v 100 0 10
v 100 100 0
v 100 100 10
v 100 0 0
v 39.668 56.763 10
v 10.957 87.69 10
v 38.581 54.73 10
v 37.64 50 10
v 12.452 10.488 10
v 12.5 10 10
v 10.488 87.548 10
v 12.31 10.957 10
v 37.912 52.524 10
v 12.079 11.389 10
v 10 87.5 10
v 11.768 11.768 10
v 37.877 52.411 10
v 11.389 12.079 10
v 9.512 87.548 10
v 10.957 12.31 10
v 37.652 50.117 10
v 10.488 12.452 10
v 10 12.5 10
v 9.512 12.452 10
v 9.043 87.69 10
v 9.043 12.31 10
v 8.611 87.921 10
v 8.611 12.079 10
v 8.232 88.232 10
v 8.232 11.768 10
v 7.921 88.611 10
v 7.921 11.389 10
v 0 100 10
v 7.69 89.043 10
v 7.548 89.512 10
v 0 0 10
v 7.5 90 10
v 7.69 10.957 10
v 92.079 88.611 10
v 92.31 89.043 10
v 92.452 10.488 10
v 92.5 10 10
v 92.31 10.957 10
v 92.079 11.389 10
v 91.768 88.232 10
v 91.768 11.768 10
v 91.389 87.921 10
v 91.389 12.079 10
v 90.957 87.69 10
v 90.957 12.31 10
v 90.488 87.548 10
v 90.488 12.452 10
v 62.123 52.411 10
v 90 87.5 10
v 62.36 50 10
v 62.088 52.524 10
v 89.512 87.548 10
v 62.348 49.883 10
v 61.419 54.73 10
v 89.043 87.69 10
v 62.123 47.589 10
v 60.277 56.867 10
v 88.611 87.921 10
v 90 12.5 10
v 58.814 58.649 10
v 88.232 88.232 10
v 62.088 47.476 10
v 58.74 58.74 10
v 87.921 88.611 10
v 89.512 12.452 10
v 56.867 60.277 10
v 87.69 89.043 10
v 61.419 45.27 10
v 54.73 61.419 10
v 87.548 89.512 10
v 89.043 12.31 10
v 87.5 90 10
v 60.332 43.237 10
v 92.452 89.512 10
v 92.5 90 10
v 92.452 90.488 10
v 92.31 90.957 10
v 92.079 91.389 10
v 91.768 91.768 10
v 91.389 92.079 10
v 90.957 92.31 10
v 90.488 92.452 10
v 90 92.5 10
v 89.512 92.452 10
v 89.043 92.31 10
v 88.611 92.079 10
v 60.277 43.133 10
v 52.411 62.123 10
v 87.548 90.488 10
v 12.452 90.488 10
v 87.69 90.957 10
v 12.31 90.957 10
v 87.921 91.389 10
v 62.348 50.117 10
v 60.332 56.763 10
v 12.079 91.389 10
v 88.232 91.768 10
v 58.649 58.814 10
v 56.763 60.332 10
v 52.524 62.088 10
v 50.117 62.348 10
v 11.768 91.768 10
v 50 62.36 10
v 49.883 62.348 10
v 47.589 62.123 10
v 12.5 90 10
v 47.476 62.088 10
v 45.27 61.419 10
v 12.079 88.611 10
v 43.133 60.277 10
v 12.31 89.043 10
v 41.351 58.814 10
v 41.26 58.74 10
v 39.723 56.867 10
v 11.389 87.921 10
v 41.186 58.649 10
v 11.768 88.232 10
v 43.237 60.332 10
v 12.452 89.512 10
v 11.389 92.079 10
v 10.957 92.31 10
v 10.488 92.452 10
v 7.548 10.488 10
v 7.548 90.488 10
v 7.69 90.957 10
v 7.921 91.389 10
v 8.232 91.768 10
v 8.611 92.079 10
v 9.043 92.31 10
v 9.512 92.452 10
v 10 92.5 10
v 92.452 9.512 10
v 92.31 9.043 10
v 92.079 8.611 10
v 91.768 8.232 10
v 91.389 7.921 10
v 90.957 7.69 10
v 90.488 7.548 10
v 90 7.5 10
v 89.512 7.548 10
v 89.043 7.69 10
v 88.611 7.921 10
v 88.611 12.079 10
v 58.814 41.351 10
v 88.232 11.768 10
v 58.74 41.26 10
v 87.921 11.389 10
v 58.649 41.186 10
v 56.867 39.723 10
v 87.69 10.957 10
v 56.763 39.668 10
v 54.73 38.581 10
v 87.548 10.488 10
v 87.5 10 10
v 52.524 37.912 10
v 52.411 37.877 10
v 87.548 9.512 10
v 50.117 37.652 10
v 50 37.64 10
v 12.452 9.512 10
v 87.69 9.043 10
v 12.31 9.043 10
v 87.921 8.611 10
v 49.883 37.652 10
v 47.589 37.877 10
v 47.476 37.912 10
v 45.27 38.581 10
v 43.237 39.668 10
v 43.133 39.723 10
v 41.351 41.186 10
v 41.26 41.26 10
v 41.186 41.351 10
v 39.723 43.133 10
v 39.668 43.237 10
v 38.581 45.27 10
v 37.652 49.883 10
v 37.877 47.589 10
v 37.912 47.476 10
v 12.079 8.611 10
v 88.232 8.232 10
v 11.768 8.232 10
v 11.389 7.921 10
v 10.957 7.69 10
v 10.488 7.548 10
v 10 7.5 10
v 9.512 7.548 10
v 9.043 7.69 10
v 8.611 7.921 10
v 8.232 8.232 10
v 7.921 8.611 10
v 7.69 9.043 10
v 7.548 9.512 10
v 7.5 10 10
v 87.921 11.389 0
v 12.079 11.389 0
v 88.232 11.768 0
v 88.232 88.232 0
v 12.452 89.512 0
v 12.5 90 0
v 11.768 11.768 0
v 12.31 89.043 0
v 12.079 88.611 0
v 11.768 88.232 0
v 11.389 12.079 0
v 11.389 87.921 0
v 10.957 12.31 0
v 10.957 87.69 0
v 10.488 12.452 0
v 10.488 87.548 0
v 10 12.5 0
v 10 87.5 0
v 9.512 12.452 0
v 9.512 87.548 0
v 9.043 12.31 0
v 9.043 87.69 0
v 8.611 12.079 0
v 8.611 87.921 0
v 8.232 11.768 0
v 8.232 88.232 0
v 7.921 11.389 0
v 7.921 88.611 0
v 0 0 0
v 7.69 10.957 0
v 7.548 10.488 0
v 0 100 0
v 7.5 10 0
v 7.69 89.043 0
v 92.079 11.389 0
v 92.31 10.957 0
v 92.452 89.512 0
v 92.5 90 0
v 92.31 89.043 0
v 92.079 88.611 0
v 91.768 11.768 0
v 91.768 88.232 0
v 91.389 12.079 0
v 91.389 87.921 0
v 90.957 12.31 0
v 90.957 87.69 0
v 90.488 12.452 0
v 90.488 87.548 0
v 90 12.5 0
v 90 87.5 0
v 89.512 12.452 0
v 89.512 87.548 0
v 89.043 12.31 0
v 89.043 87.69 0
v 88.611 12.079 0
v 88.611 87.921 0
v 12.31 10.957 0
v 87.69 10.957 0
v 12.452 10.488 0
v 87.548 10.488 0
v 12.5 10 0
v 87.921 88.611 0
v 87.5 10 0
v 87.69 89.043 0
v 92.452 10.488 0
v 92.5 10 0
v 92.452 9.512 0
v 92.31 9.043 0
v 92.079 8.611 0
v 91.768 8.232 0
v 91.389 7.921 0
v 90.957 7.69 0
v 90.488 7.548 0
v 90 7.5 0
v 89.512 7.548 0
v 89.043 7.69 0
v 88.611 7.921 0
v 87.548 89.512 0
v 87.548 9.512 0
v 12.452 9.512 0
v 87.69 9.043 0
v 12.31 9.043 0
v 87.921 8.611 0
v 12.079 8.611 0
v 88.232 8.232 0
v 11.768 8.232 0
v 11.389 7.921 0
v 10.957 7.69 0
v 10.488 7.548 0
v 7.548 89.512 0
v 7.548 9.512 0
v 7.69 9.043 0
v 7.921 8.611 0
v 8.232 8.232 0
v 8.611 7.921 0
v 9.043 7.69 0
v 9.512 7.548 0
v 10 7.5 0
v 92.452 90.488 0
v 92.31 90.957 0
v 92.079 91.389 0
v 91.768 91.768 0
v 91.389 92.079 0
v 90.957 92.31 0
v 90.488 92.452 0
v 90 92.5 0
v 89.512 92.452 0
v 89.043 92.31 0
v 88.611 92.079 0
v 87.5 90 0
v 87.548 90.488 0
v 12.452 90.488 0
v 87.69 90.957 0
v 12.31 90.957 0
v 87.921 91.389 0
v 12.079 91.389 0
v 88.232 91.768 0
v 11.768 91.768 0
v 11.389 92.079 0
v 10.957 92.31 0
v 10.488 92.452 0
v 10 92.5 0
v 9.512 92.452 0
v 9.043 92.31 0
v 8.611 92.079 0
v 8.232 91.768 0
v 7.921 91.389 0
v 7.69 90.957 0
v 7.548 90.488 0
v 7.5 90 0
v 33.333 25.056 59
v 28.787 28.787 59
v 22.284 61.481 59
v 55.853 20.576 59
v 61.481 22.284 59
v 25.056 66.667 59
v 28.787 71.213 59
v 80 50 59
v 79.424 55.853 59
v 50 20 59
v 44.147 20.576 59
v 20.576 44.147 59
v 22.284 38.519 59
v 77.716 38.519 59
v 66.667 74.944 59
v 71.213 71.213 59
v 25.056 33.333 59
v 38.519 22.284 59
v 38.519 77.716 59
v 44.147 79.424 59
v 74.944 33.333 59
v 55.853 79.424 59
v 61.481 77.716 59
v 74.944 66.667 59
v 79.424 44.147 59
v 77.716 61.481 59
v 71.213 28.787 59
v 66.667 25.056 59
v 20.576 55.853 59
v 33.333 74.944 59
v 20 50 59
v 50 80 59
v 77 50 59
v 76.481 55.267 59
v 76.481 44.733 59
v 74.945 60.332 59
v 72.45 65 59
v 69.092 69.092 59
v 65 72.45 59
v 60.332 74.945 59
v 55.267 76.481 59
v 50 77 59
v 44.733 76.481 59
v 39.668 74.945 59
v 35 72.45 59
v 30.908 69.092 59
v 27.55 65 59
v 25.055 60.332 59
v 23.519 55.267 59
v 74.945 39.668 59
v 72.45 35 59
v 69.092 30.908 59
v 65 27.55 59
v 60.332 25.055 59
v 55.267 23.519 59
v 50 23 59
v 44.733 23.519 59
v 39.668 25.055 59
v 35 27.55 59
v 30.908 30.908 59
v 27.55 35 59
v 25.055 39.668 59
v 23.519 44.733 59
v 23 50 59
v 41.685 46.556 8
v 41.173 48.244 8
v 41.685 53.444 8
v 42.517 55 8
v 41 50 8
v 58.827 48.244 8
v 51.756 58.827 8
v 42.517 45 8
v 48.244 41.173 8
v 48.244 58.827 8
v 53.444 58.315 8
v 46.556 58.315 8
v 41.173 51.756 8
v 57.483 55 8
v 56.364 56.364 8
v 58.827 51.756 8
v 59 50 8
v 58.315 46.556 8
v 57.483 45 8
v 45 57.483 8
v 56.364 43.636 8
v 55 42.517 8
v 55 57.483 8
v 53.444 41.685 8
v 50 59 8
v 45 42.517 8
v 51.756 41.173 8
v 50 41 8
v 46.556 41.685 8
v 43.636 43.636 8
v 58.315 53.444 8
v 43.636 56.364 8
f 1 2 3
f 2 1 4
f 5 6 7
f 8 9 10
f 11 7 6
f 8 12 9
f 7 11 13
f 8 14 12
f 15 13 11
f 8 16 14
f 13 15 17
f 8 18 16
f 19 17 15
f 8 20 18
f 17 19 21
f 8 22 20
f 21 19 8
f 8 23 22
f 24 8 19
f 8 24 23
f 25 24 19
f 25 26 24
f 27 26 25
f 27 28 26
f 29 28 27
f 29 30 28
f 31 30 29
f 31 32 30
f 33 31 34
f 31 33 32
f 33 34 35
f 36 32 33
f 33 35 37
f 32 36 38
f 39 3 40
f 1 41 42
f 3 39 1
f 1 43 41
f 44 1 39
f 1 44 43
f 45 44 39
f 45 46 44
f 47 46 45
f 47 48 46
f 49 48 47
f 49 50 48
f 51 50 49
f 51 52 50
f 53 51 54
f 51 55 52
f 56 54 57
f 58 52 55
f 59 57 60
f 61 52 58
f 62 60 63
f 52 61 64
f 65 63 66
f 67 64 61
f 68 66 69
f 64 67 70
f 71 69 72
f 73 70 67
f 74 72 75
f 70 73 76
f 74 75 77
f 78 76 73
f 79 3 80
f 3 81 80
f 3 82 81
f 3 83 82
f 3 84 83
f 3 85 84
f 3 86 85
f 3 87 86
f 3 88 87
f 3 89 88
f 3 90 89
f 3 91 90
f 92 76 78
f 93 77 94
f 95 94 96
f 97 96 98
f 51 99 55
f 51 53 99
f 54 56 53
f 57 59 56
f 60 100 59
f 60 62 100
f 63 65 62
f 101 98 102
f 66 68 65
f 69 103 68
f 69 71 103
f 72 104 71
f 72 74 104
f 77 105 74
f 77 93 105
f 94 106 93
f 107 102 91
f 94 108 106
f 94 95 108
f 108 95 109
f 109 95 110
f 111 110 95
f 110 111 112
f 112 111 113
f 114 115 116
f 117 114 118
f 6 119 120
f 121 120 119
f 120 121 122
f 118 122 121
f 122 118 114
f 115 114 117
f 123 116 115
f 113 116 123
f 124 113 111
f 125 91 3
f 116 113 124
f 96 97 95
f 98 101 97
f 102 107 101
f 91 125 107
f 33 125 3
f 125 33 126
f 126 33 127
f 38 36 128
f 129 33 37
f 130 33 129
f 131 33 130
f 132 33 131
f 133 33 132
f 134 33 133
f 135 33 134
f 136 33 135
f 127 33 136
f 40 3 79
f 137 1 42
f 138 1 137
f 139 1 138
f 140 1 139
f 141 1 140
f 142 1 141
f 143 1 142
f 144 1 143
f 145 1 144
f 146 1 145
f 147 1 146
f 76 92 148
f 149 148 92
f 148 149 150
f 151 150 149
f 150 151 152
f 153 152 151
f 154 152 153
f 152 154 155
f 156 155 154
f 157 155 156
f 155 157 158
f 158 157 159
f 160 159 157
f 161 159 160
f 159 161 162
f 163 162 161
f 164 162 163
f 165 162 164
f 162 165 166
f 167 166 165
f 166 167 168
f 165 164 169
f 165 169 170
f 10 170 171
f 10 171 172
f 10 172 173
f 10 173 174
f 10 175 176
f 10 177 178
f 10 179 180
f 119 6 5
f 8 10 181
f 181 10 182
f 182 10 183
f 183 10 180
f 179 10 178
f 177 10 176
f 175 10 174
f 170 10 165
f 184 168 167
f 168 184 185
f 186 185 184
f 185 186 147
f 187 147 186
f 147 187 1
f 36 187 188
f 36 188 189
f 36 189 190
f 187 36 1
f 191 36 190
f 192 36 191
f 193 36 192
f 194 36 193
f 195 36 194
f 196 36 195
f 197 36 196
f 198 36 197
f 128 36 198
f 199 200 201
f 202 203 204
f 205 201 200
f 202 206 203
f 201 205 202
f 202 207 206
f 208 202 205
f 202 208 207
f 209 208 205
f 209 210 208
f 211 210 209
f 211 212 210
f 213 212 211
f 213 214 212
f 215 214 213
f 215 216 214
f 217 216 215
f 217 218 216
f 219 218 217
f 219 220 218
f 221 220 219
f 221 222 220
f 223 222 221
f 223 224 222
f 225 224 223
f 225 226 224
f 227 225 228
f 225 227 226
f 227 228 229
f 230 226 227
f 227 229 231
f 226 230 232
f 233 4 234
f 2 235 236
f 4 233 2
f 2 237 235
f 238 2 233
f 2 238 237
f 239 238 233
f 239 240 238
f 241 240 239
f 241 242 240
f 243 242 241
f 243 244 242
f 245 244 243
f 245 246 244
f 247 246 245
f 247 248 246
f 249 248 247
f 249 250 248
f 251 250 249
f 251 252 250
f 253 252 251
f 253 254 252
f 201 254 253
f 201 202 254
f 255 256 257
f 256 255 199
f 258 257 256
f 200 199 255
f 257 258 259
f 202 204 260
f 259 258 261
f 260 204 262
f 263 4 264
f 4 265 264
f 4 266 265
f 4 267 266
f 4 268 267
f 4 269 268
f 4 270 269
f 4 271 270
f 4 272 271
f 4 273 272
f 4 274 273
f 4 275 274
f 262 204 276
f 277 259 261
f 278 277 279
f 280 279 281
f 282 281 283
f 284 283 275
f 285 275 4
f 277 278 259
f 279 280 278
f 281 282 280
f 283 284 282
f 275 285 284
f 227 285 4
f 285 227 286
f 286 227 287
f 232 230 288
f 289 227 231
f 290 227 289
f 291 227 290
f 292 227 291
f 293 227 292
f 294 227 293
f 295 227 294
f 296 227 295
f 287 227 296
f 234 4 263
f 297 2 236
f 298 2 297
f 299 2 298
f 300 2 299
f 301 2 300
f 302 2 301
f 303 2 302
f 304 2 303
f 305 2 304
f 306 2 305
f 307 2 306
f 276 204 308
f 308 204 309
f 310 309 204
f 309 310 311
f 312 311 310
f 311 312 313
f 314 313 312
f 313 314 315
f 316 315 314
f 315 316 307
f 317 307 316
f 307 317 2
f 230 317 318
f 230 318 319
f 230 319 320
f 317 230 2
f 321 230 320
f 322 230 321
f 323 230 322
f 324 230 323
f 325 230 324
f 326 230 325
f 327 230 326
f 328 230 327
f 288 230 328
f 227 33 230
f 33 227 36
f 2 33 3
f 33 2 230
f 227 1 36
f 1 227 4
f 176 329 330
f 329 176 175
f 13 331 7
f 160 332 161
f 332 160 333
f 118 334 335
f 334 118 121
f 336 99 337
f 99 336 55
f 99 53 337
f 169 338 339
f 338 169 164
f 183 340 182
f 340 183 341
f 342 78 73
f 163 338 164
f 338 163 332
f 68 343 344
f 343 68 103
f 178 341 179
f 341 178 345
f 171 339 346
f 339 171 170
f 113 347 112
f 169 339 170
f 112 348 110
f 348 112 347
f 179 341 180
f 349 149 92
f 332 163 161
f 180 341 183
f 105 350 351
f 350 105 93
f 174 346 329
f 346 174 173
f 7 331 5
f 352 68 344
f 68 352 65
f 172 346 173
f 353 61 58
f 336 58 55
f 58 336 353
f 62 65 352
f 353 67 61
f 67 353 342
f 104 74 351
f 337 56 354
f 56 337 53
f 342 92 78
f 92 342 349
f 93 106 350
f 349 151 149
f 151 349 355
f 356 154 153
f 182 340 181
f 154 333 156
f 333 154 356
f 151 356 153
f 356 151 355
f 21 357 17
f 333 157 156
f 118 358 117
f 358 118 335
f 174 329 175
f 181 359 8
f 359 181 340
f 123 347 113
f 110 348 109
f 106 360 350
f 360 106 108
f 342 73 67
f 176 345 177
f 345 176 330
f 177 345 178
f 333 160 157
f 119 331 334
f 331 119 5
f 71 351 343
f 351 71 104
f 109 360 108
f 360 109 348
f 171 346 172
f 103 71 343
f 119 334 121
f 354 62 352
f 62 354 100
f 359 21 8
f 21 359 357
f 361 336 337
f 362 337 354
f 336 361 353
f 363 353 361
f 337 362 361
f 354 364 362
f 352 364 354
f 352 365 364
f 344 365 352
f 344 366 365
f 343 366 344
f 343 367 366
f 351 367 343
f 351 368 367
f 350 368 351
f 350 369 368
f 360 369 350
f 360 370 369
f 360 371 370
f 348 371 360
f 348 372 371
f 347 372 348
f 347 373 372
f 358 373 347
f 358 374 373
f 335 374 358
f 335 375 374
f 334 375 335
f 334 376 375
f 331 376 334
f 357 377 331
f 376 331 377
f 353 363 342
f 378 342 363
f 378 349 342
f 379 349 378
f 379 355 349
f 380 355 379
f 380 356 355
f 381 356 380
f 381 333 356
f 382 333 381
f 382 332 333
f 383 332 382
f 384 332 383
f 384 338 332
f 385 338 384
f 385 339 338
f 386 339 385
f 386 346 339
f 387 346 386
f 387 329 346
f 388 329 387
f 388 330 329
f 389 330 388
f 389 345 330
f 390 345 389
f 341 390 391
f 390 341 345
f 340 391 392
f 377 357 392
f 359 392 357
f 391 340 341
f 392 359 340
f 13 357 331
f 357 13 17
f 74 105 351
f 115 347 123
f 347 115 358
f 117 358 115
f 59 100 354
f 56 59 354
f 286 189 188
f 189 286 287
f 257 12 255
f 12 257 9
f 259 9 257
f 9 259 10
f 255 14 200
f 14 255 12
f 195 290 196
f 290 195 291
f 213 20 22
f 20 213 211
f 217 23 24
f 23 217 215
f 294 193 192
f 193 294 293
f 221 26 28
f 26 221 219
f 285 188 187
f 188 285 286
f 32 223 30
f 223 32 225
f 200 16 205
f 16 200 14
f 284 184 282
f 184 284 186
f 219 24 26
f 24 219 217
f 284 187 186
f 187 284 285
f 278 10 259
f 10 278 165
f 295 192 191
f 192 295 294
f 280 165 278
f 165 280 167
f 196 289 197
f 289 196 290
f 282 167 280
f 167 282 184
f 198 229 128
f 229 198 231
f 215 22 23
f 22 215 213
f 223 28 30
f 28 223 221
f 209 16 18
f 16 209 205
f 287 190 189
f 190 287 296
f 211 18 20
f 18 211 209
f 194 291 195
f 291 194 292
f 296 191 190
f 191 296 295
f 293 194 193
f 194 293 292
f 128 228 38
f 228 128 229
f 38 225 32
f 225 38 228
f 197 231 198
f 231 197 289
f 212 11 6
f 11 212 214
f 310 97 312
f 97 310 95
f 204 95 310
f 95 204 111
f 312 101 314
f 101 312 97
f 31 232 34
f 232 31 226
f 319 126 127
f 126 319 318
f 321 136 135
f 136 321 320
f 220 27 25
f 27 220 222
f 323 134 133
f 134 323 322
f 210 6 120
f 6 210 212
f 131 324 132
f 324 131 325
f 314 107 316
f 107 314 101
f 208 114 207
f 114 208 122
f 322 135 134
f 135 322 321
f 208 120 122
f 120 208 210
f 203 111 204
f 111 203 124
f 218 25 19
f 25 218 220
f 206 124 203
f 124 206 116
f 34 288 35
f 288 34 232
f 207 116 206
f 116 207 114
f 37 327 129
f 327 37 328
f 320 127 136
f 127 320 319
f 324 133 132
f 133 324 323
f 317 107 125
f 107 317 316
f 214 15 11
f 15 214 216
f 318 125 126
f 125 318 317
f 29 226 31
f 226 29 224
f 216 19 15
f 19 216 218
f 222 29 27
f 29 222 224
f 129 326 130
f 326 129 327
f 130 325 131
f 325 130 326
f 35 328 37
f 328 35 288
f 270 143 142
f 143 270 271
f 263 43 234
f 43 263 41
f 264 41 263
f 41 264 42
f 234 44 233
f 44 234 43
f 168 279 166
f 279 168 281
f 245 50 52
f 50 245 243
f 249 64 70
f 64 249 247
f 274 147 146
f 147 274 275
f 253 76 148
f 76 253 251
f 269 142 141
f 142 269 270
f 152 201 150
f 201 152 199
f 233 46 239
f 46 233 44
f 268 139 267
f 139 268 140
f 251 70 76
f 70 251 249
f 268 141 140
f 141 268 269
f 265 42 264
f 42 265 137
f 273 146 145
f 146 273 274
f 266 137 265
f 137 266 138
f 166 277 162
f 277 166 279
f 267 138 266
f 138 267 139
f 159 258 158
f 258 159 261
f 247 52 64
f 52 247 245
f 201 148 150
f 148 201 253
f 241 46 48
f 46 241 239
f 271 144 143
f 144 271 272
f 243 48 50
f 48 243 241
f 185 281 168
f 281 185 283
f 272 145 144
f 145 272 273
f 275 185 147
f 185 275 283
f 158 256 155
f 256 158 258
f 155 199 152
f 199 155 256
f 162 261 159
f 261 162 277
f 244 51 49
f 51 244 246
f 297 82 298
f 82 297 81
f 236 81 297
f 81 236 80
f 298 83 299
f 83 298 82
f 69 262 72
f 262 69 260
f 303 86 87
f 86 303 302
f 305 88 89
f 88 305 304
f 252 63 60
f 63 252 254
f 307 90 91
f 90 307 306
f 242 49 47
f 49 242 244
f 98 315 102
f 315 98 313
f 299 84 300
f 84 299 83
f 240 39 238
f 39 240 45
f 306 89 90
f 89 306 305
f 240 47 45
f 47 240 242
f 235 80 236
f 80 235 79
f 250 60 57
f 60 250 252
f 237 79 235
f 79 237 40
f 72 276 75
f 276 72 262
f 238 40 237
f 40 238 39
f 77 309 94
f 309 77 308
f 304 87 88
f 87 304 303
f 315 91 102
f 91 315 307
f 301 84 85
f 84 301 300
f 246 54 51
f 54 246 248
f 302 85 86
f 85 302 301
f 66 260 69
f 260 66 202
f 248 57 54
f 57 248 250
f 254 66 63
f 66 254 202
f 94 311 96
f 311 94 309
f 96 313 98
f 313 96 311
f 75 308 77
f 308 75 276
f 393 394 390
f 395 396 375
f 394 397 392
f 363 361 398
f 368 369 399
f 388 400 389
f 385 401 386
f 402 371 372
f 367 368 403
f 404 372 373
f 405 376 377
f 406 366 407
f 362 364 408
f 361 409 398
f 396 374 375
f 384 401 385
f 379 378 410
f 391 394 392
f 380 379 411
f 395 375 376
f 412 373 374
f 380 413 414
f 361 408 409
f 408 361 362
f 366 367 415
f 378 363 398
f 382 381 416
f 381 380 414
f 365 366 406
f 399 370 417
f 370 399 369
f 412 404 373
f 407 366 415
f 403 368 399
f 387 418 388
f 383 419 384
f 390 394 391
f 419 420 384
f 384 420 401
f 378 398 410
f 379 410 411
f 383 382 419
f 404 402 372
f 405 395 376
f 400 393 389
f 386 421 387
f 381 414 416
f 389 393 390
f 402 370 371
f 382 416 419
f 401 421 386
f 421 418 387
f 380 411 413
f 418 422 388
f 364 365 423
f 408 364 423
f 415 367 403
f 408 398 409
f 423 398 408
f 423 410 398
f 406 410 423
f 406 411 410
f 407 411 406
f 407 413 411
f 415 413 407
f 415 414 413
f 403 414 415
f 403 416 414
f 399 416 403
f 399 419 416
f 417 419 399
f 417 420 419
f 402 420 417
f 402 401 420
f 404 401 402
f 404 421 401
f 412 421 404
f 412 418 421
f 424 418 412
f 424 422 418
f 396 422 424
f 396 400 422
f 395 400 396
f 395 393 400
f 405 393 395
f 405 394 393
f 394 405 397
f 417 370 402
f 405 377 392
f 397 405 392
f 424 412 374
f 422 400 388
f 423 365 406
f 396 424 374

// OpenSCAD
$fn = 32;

// ----------------------------------------------------------------------
// Hopper: flanged with square flange
// ----------------------------------------------------------------------

// --- parameters (mm) ---
fl = 100;                 // flange side, X and Y
fl_t = 10;                // flange thickness
cone_h = 50;              // cone height above the flange
top_d = 60;               // cone mouth diameter
bot_d = 24;               // cone spout diameter
wall = 3;                 // cone wall thickness
hole_r = 2.5;             // flange hole radius
hole_in = 10;             // hole inset from the corners

bore_d = bot_d - 2 * wall;  // spout bore diameter
total_h = fl_t + cone_h - 1;  // overall height

difference() {
  union() {
    cube([fl, fl, fl_t]);
    translate([fl / 2, fl / 2, fl_t - 1])
      cylinder(h = cone_h, d1 = bot_d, d2 = top_d);
  }
  translate([fl / 2, fl / 2, fl_t - 2])
    cylinder(h = cone_h + 1, d1 = bore_d, d2 = top_d - 2 * wall);
  for (sx = [0, 1], sy = [0, 1])
    translate([sx ? fl - hole_in : hole_in,
               sy ? fl - hole_in : hole_in, -1])
      cylinder(r = hole_r, h = fl_t + 2);
}
